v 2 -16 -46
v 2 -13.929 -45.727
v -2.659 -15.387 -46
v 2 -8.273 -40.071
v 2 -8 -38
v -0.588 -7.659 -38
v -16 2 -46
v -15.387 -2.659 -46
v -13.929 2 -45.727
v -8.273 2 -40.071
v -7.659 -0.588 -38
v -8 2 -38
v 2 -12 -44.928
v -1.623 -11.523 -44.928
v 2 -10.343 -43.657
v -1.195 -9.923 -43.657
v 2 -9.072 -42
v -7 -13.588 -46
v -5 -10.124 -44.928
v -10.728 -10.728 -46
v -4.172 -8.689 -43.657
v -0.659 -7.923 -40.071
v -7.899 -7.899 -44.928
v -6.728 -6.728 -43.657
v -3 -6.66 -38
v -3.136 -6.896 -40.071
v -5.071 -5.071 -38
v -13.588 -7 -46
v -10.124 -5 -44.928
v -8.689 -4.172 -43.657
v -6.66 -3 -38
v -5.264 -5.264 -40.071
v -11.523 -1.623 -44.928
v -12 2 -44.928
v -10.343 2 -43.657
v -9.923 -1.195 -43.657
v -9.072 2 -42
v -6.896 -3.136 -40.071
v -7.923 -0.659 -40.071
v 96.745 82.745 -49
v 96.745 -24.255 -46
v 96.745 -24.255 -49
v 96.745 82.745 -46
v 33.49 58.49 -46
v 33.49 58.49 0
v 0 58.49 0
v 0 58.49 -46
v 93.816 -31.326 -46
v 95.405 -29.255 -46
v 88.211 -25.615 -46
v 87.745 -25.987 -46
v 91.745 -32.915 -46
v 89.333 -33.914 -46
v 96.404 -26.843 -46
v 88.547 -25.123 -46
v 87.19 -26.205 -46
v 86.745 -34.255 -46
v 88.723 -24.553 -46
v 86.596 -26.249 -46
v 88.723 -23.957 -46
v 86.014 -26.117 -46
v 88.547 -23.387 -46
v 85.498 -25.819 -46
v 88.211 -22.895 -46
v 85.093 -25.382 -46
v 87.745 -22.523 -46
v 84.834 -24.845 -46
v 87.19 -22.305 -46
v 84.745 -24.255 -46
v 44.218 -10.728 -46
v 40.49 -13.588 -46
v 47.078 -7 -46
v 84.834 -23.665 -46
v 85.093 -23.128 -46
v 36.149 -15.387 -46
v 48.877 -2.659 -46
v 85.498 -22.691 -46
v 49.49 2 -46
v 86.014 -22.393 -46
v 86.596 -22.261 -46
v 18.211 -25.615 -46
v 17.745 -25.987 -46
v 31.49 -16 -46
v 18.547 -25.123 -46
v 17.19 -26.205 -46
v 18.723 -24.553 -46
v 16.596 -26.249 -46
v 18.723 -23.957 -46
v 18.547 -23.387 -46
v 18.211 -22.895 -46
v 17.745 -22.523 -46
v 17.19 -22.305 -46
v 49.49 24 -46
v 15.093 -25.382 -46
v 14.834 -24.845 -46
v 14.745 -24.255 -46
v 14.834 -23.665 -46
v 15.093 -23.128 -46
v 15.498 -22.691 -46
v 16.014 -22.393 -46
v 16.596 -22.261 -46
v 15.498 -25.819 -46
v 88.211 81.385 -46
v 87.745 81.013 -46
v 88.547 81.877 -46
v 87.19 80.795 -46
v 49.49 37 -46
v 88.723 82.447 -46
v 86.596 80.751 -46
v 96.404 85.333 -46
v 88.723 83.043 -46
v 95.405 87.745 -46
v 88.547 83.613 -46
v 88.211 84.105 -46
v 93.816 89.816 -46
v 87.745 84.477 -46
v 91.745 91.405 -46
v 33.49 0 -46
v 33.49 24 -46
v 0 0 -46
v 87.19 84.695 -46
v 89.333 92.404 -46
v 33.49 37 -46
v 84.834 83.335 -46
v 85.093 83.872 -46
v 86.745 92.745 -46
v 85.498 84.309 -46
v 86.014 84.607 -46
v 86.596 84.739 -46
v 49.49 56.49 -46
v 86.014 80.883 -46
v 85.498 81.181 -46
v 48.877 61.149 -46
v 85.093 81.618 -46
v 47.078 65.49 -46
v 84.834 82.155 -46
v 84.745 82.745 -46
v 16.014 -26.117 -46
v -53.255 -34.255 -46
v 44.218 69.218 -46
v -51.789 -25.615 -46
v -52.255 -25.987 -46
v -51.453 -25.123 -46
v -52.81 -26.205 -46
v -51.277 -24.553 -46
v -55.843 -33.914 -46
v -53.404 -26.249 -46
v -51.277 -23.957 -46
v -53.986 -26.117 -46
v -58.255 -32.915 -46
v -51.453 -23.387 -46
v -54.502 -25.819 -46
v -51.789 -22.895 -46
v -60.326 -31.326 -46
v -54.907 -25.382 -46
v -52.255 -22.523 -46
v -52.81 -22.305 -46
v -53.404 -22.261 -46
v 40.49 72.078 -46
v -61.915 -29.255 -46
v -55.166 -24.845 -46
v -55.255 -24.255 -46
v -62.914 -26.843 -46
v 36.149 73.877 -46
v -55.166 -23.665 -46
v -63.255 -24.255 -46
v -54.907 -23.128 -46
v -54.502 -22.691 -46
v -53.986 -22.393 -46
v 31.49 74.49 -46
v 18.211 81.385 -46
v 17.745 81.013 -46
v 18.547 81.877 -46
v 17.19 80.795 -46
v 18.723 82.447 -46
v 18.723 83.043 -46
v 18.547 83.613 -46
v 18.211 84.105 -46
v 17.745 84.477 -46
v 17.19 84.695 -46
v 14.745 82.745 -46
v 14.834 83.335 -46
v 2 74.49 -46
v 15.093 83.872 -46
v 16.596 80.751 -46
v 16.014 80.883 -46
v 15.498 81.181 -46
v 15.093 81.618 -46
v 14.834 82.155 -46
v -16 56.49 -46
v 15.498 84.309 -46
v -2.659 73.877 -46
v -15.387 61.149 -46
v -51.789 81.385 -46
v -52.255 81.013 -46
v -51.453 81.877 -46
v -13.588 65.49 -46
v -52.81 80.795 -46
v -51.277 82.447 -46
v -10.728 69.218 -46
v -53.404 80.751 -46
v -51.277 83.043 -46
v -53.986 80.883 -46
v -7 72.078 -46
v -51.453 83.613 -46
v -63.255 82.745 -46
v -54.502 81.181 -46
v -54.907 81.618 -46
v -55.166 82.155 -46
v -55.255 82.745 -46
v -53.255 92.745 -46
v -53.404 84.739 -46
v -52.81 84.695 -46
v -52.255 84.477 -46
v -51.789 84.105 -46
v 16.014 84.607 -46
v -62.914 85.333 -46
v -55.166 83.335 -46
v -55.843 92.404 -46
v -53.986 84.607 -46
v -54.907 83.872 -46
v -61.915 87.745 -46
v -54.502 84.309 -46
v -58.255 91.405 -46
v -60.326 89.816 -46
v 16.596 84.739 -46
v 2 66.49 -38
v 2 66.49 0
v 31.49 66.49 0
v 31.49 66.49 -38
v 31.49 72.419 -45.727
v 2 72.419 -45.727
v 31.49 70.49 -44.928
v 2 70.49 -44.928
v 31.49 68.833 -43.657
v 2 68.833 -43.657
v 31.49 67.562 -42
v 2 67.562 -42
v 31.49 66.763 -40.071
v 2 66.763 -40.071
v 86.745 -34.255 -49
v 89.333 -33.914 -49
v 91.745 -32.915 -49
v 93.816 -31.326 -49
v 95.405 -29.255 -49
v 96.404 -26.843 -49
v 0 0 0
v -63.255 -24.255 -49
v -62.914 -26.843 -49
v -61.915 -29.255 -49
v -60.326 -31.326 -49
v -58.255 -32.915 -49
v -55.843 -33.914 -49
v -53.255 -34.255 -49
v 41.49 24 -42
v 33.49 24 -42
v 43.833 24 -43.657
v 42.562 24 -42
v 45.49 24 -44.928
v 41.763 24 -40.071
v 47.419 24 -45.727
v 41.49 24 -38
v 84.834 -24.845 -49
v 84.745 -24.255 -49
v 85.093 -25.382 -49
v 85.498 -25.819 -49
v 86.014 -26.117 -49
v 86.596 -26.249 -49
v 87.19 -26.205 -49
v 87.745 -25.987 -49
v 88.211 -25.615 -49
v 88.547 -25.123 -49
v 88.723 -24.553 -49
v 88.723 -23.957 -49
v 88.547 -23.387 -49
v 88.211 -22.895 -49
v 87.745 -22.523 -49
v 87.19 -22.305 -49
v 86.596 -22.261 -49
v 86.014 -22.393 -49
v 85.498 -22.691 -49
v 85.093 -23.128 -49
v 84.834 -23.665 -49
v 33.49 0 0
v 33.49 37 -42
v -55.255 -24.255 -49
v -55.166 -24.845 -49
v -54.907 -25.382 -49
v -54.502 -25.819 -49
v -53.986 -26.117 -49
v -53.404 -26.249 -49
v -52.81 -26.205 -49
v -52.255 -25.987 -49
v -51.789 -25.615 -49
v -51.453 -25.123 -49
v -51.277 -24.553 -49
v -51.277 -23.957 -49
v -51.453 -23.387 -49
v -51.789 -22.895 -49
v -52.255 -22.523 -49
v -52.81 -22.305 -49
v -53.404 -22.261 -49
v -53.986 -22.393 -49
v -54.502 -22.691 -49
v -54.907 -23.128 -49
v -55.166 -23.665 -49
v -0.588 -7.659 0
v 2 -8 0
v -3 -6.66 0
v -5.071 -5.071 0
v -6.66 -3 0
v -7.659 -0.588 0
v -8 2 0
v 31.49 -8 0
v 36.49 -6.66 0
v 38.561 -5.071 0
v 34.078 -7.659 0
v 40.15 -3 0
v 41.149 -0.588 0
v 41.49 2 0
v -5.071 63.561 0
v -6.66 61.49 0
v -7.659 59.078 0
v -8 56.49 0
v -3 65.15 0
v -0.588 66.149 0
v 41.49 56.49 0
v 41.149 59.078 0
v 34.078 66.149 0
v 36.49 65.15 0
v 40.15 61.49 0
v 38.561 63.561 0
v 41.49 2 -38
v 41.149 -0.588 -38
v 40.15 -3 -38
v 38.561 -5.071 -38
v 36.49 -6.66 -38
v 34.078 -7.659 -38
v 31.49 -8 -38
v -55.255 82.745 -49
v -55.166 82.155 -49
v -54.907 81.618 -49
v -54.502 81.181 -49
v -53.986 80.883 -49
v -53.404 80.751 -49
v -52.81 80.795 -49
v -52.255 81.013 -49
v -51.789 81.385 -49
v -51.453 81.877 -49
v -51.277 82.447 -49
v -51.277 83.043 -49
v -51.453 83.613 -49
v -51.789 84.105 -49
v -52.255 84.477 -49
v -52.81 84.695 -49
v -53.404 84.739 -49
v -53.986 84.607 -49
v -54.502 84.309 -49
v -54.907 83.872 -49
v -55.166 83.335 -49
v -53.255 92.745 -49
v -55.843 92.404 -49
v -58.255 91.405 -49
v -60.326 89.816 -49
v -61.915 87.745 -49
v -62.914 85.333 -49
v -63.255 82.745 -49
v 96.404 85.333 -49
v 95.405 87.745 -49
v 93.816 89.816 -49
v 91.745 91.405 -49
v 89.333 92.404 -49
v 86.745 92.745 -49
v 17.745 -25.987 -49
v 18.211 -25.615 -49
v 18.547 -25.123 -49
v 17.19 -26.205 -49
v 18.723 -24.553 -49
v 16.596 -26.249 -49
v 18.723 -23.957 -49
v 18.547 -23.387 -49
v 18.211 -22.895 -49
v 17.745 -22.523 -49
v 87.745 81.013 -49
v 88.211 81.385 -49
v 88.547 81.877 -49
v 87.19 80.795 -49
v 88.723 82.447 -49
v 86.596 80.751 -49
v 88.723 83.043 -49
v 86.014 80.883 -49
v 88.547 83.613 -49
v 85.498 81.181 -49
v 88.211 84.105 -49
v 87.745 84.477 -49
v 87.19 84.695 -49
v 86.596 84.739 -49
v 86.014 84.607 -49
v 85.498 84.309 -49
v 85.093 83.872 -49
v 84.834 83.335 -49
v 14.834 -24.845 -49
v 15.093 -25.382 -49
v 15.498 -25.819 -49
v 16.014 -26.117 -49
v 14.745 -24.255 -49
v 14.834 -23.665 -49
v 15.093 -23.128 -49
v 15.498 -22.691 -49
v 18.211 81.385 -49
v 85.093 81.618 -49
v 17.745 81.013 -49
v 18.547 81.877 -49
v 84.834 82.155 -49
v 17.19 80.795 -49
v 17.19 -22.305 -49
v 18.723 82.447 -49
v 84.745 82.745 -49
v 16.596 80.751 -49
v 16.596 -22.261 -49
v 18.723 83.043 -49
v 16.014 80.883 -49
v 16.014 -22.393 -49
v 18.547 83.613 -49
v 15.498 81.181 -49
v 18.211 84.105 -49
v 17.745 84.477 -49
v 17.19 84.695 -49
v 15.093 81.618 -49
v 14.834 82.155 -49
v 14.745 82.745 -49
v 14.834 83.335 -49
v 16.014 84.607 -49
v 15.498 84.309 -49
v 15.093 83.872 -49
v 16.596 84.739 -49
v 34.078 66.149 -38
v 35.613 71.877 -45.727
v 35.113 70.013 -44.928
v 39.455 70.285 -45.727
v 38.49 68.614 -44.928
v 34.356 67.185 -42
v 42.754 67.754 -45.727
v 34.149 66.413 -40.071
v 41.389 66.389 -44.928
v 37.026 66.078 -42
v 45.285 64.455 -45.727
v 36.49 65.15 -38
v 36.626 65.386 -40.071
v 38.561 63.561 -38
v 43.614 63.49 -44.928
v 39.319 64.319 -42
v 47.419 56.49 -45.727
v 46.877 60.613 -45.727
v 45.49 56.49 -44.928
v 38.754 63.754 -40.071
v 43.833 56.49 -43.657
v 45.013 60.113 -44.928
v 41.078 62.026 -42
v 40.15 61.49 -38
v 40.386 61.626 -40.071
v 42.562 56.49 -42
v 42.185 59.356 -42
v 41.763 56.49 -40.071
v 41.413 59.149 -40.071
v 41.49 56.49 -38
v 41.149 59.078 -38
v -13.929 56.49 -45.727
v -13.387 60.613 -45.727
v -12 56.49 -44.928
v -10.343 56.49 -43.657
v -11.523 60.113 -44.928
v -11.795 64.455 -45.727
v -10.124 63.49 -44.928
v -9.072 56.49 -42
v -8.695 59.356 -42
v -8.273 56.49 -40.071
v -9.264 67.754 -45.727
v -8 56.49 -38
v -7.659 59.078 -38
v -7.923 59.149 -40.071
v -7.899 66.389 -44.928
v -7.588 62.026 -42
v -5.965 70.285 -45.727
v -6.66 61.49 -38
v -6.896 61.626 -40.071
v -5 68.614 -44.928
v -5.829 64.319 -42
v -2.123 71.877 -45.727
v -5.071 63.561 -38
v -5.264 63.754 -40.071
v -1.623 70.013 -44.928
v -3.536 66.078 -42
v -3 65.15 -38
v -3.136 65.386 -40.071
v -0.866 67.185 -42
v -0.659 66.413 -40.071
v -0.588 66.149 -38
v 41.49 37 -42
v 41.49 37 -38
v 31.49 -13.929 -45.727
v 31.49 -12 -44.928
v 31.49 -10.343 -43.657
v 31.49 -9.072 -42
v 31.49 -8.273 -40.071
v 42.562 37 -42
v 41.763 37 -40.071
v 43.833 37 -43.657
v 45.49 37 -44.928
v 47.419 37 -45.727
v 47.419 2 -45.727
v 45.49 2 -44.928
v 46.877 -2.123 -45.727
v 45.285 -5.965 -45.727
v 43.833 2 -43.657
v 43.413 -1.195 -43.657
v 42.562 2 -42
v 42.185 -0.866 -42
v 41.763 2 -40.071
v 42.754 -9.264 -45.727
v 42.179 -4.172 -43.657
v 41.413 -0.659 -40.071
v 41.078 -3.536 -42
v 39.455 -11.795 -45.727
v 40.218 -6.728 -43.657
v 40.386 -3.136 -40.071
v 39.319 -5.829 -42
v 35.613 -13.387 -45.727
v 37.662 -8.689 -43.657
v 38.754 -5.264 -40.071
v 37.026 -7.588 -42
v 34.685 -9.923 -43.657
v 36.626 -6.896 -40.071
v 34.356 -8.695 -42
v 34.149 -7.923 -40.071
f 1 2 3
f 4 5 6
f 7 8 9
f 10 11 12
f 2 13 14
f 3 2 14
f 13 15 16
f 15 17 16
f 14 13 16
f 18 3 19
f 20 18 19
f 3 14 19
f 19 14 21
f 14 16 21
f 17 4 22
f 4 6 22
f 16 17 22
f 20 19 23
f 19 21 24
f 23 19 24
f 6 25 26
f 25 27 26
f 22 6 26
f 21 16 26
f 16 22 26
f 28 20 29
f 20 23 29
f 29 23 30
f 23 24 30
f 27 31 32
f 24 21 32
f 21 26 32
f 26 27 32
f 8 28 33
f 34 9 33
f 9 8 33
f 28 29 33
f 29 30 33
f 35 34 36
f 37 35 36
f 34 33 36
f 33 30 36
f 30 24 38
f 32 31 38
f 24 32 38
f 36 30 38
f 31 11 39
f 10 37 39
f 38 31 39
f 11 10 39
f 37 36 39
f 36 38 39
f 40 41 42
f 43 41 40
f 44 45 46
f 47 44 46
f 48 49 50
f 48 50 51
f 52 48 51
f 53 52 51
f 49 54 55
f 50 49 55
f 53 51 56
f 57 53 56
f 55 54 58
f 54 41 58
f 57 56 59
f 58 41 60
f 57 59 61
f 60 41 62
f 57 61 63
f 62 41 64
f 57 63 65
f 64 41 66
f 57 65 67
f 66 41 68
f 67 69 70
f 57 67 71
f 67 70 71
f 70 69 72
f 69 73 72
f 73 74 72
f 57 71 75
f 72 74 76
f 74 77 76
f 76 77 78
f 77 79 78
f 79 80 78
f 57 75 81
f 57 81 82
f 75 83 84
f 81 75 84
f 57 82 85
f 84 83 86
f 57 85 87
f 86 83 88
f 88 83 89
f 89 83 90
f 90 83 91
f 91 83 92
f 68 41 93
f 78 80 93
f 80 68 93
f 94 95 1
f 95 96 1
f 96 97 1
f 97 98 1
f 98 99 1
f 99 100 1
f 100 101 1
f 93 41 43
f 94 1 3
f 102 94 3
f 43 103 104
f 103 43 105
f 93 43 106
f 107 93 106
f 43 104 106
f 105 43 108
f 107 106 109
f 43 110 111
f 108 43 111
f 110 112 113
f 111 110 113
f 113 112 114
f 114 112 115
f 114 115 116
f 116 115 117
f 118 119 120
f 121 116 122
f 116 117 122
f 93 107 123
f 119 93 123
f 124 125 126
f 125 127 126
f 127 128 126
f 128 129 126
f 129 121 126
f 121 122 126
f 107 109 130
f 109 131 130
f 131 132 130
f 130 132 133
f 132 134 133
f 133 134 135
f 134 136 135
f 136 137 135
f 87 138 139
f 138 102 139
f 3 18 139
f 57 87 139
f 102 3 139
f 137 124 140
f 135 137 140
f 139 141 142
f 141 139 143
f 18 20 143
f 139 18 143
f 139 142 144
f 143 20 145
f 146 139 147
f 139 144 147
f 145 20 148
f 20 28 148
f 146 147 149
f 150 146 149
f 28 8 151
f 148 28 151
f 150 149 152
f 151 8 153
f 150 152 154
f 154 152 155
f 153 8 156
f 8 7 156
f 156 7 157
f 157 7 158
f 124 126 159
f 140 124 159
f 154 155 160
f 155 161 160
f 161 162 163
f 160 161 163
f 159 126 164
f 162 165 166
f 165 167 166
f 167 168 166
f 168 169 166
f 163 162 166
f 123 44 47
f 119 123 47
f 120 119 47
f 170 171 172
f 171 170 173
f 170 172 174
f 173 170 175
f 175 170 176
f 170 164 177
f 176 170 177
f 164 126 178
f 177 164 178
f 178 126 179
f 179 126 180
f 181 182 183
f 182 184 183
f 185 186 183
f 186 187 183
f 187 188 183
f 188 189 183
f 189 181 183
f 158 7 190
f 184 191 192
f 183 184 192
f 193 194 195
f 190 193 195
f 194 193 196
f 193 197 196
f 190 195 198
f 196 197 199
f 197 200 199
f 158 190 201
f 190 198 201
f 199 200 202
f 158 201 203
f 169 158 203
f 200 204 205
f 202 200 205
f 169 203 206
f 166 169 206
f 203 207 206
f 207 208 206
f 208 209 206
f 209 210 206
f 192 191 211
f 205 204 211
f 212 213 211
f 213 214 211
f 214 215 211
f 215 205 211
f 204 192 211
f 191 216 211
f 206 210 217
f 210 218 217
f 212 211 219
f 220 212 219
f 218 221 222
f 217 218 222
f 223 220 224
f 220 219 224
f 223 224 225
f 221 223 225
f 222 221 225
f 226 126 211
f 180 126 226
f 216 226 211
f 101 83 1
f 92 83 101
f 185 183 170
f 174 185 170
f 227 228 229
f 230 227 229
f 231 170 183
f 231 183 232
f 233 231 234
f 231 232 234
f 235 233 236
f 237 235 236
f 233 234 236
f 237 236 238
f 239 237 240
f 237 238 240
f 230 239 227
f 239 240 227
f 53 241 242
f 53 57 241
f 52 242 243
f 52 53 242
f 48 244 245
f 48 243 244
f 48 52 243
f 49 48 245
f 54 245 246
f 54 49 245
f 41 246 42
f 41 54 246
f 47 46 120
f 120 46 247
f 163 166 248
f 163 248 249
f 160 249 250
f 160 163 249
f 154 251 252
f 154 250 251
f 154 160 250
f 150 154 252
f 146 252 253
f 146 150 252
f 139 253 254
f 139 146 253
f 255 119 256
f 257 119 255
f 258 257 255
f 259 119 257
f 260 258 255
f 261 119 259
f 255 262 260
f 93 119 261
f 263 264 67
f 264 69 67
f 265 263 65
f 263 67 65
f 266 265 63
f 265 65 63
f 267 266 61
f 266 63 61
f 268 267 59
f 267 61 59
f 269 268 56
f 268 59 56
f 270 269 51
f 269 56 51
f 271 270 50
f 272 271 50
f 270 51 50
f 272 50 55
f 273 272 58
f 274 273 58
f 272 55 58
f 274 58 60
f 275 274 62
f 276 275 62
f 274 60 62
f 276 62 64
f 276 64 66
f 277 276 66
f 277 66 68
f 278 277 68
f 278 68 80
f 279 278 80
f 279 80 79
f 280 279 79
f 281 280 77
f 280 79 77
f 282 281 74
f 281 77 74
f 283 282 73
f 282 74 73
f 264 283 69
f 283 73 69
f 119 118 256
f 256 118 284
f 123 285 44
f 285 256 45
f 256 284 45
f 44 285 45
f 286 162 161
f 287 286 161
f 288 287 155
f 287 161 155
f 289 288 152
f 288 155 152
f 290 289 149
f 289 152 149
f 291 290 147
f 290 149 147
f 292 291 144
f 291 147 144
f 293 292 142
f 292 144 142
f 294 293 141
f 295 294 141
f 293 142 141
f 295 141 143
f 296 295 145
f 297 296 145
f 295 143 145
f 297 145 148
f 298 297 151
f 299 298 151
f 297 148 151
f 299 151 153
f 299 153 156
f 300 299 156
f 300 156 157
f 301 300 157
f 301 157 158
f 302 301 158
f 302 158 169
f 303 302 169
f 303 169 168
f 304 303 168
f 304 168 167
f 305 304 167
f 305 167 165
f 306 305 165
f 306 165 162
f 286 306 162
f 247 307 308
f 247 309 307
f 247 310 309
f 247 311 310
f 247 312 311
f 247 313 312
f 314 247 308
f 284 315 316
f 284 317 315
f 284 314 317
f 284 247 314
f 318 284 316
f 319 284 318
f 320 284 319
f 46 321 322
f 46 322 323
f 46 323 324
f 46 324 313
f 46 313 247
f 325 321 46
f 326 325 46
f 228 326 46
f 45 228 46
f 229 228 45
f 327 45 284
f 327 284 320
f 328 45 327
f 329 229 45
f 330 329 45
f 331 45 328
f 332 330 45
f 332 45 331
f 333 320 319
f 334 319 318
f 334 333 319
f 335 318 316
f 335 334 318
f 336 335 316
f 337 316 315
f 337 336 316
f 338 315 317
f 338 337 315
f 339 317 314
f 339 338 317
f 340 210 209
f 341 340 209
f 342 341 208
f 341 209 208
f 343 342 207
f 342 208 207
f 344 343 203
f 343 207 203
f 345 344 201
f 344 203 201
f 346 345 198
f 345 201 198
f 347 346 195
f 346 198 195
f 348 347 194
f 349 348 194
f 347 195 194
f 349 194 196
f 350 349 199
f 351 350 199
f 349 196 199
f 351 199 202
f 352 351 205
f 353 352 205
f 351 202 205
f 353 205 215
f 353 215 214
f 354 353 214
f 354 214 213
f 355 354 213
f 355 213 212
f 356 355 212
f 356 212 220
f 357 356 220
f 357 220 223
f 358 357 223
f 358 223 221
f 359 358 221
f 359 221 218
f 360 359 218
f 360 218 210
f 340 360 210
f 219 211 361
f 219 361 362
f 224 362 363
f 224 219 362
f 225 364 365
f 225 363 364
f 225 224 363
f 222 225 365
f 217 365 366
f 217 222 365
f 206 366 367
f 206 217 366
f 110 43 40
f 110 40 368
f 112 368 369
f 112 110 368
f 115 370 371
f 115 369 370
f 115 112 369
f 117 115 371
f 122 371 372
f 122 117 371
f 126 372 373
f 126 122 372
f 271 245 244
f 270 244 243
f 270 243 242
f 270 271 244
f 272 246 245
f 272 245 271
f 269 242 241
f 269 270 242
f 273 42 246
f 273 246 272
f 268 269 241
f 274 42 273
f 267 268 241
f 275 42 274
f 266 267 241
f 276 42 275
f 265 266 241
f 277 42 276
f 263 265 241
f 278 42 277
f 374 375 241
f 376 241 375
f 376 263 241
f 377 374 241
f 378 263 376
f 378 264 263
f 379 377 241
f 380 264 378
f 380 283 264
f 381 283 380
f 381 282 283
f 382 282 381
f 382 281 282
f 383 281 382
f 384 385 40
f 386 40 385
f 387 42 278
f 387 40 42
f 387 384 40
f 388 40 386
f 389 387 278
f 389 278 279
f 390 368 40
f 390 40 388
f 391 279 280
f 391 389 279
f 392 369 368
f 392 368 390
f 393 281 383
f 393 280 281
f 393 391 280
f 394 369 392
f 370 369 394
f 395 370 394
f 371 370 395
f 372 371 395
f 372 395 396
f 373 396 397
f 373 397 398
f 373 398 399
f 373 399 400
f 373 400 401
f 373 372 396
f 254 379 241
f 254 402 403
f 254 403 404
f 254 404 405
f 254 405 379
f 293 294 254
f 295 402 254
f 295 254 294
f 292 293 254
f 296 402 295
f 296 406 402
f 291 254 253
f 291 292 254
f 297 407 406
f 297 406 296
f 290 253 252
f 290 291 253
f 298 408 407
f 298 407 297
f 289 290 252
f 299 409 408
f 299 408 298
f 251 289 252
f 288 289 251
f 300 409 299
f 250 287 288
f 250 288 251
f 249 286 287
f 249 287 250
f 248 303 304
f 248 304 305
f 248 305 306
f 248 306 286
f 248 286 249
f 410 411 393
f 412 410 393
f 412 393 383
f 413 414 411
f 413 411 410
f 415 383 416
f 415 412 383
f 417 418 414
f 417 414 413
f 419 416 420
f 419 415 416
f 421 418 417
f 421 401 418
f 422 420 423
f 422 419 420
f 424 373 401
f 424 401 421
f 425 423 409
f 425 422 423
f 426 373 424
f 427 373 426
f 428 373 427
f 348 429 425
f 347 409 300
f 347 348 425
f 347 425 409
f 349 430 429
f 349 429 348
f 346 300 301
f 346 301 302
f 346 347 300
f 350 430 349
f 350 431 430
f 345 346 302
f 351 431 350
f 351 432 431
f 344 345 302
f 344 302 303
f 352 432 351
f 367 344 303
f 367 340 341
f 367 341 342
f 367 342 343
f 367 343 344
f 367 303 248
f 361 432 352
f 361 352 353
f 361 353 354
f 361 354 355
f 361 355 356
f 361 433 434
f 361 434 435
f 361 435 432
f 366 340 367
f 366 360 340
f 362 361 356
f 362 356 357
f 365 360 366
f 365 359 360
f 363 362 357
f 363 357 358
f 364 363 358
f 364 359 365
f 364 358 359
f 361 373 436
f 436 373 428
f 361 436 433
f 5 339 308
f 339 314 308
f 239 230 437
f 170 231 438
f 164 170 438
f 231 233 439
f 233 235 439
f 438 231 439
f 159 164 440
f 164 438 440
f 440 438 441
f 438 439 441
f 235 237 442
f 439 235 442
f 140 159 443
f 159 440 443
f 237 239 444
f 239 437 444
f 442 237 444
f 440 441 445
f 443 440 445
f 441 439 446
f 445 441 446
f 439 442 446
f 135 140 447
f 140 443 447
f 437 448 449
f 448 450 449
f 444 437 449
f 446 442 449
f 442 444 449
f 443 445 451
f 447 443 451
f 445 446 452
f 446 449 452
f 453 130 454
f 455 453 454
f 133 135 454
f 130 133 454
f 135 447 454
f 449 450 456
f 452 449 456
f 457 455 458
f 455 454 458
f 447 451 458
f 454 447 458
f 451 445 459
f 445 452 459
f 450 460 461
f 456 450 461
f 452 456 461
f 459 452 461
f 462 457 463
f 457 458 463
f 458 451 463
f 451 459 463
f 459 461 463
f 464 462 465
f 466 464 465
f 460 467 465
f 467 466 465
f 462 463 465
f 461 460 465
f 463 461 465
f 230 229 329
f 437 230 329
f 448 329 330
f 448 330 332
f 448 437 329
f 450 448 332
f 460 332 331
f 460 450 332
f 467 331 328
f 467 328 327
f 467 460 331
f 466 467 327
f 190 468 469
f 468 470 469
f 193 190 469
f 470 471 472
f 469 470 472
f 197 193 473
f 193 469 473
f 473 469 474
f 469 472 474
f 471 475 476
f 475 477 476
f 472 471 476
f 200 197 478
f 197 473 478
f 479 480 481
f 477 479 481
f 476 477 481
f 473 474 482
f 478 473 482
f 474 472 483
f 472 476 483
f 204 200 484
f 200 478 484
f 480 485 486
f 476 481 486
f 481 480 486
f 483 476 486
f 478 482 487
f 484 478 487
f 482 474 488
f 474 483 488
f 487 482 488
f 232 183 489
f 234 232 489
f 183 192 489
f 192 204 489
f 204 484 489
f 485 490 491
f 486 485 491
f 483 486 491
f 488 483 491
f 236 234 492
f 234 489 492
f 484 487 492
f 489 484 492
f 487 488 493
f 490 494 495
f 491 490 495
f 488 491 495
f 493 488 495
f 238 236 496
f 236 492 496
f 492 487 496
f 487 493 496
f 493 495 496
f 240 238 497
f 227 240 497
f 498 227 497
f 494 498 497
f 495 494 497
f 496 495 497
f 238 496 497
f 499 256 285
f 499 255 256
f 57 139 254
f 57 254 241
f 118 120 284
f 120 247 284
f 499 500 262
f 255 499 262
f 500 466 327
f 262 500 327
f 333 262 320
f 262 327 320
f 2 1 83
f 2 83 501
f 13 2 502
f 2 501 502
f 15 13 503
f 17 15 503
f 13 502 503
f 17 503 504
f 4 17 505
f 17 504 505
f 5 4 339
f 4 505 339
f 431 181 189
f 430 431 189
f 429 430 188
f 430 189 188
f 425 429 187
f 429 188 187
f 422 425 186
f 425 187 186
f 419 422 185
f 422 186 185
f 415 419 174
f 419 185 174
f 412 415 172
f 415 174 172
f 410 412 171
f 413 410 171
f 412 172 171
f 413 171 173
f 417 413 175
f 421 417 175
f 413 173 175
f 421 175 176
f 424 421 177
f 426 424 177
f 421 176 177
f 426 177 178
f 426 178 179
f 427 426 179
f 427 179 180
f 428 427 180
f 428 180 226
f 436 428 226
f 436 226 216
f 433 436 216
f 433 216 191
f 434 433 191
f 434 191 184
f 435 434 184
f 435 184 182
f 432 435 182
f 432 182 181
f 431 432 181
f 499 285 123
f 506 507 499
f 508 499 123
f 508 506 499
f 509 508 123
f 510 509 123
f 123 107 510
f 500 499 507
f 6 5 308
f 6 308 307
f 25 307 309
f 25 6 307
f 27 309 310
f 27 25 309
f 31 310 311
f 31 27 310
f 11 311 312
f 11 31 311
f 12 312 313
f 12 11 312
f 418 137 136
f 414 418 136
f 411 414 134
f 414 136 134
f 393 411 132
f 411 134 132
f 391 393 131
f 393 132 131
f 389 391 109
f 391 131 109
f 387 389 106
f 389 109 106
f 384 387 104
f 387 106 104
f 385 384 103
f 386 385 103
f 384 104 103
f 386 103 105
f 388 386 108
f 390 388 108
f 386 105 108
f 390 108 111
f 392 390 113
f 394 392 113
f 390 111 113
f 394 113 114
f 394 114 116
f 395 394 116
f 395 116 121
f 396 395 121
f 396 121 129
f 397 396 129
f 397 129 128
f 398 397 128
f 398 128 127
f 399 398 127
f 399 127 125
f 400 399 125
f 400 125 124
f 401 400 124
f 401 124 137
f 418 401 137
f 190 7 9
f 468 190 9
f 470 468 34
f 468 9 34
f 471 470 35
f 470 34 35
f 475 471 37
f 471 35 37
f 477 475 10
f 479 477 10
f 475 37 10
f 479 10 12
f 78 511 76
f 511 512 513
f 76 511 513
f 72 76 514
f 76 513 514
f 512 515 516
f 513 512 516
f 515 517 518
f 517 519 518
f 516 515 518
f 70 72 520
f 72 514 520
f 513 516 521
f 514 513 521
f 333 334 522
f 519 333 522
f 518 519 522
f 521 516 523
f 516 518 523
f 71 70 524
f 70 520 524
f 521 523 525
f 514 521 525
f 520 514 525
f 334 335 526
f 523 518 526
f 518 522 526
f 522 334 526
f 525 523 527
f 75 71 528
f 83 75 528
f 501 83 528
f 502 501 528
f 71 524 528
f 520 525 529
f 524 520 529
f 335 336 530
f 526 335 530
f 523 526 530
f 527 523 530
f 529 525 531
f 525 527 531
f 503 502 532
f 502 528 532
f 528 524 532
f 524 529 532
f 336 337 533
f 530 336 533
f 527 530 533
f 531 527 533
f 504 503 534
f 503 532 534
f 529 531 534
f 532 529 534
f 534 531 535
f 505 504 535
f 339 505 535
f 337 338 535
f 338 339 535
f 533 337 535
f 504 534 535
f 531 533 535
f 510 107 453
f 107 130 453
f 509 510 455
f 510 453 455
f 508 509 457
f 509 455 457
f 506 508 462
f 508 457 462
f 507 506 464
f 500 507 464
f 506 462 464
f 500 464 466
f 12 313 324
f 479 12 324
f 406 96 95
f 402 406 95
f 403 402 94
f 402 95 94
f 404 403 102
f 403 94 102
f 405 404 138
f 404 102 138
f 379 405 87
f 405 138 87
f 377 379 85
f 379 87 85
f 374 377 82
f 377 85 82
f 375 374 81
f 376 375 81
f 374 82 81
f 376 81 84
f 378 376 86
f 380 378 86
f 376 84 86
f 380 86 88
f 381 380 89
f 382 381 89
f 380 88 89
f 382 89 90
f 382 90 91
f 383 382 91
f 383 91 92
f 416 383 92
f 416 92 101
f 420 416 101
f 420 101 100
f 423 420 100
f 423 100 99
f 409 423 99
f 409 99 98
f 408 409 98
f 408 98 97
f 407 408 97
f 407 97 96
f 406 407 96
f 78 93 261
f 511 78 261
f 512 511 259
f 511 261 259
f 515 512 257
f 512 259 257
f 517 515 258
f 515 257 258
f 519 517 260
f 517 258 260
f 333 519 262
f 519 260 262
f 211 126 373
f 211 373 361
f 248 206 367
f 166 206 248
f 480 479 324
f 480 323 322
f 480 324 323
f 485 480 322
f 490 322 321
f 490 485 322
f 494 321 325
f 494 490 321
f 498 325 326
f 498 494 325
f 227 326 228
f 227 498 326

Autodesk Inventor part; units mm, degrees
ref_plane "YZ Plane" through (0, 0, 0) normal (1, 0, 0) x (0, 1, 0)
ref_plane "XZ Plane" through (0, 0, 0) normal (0, 1, 0) x (-1, 0, 0)
ref_plane "XY Plane" through (0, 0, 0) normal (0, 0, 1) x (1, 0, 0)
sketch "Sketch1" plane through (0, 0, 0) normal (0, 0, 1) x (1, 0, 0)
  line L0 (0, 0) -> (33.49, 0)
  line L1 (33.49, 0) -> (33.49, 58.49)
  line L2 (33.49, 58.49) -> (0, 58.49)
  line L3 (0, 58.49) -> (0, 0)
  line L4 (-8, 66.49) -> (41.49, 66.49)
  line L5 (41.49, 66.49) -> (41.49, -8)
  line L6 (41.49, -8) -> (-8, -8)
  line L7 (-8, -8) -> (-8, 66.49)
  line L8 (56.49, -8) -> (56.49, 66.49)
  line L9 (41.49, 81.49) -> (-8, 81.49)
  line L10 (-23, 66.49) -> (-23, -8)
  line L11 (-8, -23) -> (41.49, -23)
  circle A0 centre (48.99, 62.49) radius 2.55
  circle A1 centre (48.99, -4) radius 2.55
  circle A2 centre (-15.5, 62.49) radius 2.55
  circle A3 centre (-15.5, -4) radius 2.55
  arc A4 (-8, 81.49) -> (-23, 66.49) centre (-8, 66.49) ccw
  arc A5 (56.49, 66.49) -> (41.49, 81.49) centre (41.49, 66.49) ccw
  arc A6 (41.49, -23) -> (56.49, -8) centre (41.49, -8) ccw
  arc A7 (-23, -8) -> (-8, -23) centre (-8, -8) ccw
  dimension "d0" = 58.49
  dimension "d1" = 33.49
  dimension "d2" = 8
  dimension "d3" = 15
  dimension "d4" = 5.1
  dimension "d5" = 7.5
  dimension "d6" = 5.1
  dimension "d7" = 5.1
  dimension "d8" = 7.5
  dimension "d9" = 5.1
  dimension "d10" = 4
  dimension "d11" = 4
  dimension "d12" = 4
  dimension "d13" = 4
  dimension "d14" = 7.5
  dimension "d15" = 7.5
  dimension "d16" = 15
extrude "Extrusion1" add sketch "Sketch1" against normal blind 46 contours L4 L5 L6 L7
fillet "Fillet1" radius 10 4 edges at (41.49, 66.49, -23) (41.49, -8, -23) (-8, 66.49, -23) (-8, -8, -23)
sketch "Sketch3" plane through (41.49, 2, 0) normal (1, 0, 0) x (0, 0, -1)
  line L0 (46, 56.49) -> (46, -2) projected
  line L1 (46, 22) -> (42, 22)
  line L2 (42, 22) -> (46, 22)
  line L3 (46, 35) -> (42, 35)
  line L4 (42, 22) -> (42, 35)
  line L5 (0, 54.49) -> (46, 54.49) projected
  line L6 (46, 65.745) -> (51, 65.745) projected
  point P0 (0, -2)
  point P1 (44, 22)
  point P2 (44, 35)
  point P3 (48.5, 65.745)
  dimension "d37" = 4
  dimension "d38" = 4
  dimension "d39" = 13
  dimension "d41" = 30.745
extrude "Extrusion3" cut sketch "Sketch3" against normal up to surface (8 mm away)
sketch "Sketch4" plane through (0, 0, -46) normal (0, 0, -1) x (-1, 0, 0)
  line L0 (-86.745, 92.745) -> (53.255, 92.745)
  line L1 (63.255, 82.745) -> (63.255, -24.255)
  line L2 (53.255, -34.255) -> (-86.745, -34.255)
  line L3 (-96.745, -24.255) -> (-96.745, 82.745)
  line L4 (-31.49, -8) -> (-2, -8) projected
  line L5 (-2, 66.49) -> (-31.49, 66.49) projected
  line L6 (8, 2) -> (8, 56.49) projected
  line L7 (-41.49, 56.49) -> (-41.49, 37) projected
  arc A0 (-86.745, 92.745) -> (-96.745, 82.745) centre (-86.745, 82.745) ccw
  arc A1 (63.255, 82.745) -> (53.255, 92.745) centre (53.255, 82.745) ccw
  arc A2 (53.255, -34.255) -> (63.255, -24.255) centre (53.255, -24.255) ccw
  arc A3 (-96.745, -24.255) -> (-86.745, -34.255) centre (-86.745, -24.255) ccw
  line L8 (53.255, 82.745) -> (-86.745, 82.745)
  line L9 (-86.745, 82.745) -> (-86.745, -24.255)
  line L10 (-86.745, -24.255) -> (53.255, -24.255)
  line L11 (53.255, -24.255) -> (53.255, 82.745)
  circle A4 centre (-86.745, 82.745) radius 2
  circle A5 centre (53.255, 82.745) radius 2
  circle A6 centre (53.255, -24.255) radius 2
  circle A7 centre (-86.745, -24.255) radius 2
  circle A8 centre (-16.745, 82.745) radius 2
  circle A9 centre (-16.745, -24.255) radius 2
  point P0 (0, 0)
  dimension "d46" = 160
  dimension "d47" = 127
  dimension "d48" = 74.49
  dimension "d49" = 49.49
  dimension "d50" = 55.255
  dimension "d51" = 26.255
  dimension "d52" = 10
  dimension "d53" = 10
  dimension "d54" = 107
  dimension "d55" = 140
  dimension "d56" = 4
  dimension "d57" = 4
  dimension "d58" = 4
  dimension "d59" = 4
  dimension "d60" = 4
  dimension "d61" = 4
extrude "Extrusion4" add sketch "Sketch4" along normal blind 3 contours L0 A1 L1 A2 L2 A3 L3 A0 | L8 A8 A5 L11 A6 L10 A9 A7 L9 A4
fillet "Fillet2" radius 8 9 edges at (38.5611, 63.5611, -46) (41.49, 46.745, -46) (-5.0711, 63.5611, -46) (-8, 29.245, -46) (-5.0711, -5.0711, -46) (16.745, -8, -46) (38.5611, -5.0711, -46) (41.49, 13, -46) (16.745, 66.49, -46)
properties part number "Base_Demo_1"
